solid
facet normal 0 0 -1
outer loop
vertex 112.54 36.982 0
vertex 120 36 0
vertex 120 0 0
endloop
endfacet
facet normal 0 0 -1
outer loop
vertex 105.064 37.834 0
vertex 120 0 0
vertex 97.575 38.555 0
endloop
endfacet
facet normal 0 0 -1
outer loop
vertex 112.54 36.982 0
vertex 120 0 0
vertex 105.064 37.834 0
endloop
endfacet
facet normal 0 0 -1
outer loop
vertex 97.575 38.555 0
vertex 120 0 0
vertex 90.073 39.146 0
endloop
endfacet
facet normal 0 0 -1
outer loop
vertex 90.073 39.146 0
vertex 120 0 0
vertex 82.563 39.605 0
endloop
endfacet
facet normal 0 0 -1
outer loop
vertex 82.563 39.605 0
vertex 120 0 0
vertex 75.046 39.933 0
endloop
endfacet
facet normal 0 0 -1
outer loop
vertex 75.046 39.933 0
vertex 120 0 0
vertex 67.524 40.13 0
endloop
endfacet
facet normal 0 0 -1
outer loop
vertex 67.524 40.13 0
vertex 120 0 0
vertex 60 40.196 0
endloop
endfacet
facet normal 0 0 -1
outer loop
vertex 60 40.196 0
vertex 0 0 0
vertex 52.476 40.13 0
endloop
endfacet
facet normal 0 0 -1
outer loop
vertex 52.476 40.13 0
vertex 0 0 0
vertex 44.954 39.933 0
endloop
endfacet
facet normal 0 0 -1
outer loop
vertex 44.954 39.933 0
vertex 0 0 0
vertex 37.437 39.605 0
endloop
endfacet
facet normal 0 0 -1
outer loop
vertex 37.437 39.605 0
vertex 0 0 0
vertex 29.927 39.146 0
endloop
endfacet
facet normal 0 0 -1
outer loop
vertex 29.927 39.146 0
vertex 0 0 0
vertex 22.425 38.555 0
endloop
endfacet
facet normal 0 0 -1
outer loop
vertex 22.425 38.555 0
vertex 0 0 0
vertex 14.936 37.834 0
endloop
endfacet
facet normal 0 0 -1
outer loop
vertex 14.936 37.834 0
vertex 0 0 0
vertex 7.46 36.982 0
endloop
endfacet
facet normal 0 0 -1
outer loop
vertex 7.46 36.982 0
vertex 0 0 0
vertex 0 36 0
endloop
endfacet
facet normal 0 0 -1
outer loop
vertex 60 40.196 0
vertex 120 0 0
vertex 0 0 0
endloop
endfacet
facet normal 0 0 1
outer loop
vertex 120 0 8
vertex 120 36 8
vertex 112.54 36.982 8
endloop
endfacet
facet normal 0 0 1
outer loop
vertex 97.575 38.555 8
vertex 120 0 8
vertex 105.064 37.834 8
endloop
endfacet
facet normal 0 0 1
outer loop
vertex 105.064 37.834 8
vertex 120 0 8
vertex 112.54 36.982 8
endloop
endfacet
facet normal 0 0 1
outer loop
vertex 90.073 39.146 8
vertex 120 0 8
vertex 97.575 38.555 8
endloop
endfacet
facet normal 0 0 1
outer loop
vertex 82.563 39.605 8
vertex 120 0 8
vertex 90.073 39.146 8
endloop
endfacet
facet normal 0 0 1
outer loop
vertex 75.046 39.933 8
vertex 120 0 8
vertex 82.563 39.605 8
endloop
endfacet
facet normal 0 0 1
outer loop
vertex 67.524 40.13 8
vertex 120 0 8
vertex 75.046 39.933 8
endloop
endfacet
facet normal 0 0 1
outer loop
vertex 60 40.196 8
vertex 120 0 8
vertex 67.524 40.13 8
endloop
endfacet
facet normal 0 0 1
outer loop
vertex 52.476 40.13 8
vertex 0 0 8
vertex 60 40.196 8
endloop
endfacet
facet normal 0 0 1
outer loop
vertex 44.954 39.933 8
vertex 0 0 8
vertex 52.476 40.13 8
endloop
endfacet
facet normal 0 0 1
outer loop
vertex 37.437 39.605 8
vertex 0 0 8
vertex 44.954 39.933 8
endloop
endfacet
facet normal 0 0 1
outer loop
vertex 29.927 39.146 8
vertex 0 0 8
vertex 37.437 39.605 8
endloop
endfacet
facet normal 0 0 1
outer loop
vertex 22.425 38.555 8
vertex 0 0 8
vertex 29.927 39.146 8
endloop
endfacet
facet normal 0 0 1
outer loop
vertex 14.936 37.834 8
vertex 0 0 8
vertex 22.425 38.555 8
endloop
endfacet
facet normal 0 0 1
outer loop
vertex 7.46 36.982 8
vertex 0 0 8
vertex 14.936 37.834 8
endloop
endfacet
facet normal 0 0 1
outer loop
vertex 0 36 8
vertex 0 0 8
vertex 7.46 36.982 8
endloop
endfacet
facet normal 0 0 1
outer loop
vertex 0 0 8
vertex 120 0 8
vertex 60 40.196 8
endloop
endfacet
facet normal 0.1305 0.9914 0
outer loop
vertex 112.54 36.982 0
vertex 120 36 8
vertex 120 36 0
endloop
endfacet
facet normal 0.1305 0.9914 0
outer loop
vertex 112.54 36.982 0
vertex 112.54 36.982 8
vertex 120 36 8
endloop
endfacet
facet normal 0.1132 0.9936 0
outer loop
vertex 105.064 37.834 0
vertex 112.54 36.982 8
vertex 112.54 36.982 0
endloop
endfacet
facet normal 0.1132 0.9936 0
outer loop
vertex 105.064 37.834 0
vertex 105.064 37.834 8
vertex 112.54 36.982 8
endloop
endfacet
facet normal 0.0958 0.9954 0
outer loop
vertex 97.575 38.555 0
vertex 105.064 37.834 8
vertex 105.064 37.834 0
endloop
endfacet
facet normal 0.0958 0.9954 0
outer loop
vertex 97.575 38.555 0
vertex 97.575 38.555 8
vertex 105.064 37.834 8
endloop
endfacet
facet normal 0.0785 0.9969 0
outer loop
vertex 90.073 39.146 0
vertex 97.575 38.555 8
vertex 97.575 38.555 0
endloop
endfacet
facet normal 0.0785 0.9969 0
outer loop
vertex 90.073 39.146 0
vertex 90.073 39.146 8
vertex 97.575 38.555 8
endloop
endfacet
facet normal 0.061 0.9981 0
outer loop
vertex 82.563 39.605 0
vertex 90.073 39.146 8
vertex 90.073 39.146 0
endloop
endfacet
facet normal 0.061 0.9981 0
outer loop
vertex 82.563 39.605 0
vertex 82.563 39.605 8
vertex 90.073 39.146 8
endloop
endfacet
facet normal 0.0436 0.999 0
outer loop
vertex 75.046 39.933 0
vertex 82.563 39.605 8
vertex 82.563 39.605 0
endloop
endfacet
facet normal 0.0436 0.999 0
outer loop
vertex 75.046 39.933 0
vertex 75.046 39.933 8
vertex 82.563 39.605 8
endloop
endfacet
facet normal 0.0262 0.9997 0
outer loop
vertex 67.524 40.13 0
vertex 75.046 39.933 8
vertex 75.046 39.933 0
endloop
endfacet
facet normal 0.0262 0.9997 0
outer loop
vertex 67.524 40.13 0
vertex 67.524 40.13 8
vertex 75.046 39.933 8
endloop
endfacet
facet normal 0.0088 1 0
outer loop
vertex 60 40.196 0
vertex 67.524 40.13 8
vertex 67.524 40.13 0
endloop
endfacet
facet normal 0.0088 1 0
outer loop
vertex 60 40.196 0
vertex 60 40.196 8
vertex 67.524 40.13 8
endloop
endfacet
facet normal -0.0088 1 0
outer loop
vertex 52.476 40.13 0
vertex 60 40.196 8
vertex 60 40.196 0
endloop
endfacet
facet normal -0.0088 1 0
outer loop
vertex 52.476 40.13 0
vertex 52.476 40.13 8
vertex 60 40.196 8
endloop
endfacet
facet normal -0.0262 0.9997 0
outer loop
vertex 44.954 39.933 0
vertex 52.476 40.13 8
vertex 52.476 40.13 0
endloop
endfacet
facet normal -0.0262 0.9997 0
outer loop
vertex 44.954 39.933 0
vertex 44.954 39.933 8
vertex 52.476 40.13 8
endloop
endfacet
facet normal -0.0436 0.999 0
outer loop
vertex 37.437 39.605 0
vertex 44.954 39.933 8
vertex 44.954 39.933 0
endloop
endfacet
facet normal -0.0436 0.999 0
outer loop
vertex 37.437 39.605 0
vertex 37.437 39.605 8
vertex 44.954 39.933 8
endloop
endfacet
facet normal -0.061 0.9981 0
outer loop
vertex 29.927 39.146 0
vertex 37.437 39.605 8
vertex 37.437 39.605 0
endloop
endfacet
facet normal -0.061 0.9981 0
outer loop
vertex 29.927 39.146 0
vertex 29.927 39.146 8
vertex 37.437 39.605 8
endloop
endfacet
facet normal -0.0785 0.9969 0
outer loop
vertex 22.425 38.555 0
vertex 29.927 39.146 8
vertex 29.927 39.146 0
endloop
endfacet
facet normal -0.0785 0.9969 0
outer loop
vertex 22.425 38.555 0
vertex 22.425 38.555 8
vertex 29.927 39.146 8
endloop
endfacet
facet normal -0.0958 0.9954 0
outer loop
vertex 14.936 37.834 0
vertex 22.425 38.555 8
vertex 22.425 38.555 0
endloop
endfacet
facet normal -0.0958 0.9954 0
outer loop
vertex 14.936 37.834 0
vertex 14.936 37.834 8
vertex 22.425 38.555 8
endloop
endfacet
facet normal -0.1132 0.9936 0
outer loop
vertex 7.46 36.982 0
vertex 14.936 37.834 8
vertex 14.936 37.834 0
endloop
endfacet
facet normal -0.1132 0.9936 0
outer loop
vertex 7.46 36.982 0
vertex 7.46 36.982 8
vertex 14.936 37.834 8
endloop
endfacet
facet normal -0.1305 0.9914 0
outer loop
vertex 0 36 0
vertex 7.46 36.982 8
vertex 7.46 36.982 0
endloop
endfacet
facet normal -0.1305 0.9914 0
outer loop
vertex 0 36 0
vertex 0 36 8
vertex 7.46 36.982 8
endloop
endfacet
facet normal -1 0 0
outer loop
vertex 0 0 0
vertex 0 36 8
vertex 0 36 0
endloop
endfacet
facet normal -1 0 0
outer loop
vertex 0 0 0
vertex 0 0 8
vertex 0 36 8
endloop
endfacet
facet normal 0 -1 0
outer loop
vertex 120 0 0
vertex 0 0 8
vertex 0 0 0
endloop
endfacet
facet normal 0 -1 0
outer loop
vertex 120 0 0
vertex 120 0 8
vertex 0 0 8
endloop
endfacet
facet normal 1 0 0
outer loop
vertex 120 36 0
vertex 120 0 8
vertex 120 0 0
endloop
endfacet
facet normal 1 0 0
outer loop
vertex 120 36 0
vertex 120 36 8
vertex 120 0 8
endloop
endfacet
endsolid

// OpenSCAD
$fn = 32;

// ----------------------------------------------------------------------
// Arc profile plate: crown, 19 points
// ----------------------------------------------------------------------

// --- parameters (mm) ---
bar_l = 120;              // bar length, X
bar_w = 36;               // bar height at the ends, Y
arc_r = 431.12;           // radius of the crown arc
arc_angle = 16;           // crown arc angle, degrees
crown_rise = 4.2;         // rise of the crown over the ends
arc_step = 1;             // sampling step of the crown arc, degrees
plate_t = 8;              // plate thickness, Z

bbox_y = bar_w + crown_rise;  // full height with the crown

profile = [[120, 36], [112.54, 36.982], [105.064, 37.834], [97.575, 38.555], [90.073, 39.146], [82.563, 39.605], [75.046, 39.933], [67.524, 40.13], [60, 40.196], [52.476, 40.13], [44.954, 39.933], [37.437, 39.605], [29.927, 39.146], [22.425, 38.555], [14.936, 37.834], [7.46, 36.982], [0, 36], [0, 0], [120, 0]];  // primary outline, 19 points, counter clockwise

// --- the one profile operation ---
linear_extrude(height = plate_t) polygon(points = profile);
